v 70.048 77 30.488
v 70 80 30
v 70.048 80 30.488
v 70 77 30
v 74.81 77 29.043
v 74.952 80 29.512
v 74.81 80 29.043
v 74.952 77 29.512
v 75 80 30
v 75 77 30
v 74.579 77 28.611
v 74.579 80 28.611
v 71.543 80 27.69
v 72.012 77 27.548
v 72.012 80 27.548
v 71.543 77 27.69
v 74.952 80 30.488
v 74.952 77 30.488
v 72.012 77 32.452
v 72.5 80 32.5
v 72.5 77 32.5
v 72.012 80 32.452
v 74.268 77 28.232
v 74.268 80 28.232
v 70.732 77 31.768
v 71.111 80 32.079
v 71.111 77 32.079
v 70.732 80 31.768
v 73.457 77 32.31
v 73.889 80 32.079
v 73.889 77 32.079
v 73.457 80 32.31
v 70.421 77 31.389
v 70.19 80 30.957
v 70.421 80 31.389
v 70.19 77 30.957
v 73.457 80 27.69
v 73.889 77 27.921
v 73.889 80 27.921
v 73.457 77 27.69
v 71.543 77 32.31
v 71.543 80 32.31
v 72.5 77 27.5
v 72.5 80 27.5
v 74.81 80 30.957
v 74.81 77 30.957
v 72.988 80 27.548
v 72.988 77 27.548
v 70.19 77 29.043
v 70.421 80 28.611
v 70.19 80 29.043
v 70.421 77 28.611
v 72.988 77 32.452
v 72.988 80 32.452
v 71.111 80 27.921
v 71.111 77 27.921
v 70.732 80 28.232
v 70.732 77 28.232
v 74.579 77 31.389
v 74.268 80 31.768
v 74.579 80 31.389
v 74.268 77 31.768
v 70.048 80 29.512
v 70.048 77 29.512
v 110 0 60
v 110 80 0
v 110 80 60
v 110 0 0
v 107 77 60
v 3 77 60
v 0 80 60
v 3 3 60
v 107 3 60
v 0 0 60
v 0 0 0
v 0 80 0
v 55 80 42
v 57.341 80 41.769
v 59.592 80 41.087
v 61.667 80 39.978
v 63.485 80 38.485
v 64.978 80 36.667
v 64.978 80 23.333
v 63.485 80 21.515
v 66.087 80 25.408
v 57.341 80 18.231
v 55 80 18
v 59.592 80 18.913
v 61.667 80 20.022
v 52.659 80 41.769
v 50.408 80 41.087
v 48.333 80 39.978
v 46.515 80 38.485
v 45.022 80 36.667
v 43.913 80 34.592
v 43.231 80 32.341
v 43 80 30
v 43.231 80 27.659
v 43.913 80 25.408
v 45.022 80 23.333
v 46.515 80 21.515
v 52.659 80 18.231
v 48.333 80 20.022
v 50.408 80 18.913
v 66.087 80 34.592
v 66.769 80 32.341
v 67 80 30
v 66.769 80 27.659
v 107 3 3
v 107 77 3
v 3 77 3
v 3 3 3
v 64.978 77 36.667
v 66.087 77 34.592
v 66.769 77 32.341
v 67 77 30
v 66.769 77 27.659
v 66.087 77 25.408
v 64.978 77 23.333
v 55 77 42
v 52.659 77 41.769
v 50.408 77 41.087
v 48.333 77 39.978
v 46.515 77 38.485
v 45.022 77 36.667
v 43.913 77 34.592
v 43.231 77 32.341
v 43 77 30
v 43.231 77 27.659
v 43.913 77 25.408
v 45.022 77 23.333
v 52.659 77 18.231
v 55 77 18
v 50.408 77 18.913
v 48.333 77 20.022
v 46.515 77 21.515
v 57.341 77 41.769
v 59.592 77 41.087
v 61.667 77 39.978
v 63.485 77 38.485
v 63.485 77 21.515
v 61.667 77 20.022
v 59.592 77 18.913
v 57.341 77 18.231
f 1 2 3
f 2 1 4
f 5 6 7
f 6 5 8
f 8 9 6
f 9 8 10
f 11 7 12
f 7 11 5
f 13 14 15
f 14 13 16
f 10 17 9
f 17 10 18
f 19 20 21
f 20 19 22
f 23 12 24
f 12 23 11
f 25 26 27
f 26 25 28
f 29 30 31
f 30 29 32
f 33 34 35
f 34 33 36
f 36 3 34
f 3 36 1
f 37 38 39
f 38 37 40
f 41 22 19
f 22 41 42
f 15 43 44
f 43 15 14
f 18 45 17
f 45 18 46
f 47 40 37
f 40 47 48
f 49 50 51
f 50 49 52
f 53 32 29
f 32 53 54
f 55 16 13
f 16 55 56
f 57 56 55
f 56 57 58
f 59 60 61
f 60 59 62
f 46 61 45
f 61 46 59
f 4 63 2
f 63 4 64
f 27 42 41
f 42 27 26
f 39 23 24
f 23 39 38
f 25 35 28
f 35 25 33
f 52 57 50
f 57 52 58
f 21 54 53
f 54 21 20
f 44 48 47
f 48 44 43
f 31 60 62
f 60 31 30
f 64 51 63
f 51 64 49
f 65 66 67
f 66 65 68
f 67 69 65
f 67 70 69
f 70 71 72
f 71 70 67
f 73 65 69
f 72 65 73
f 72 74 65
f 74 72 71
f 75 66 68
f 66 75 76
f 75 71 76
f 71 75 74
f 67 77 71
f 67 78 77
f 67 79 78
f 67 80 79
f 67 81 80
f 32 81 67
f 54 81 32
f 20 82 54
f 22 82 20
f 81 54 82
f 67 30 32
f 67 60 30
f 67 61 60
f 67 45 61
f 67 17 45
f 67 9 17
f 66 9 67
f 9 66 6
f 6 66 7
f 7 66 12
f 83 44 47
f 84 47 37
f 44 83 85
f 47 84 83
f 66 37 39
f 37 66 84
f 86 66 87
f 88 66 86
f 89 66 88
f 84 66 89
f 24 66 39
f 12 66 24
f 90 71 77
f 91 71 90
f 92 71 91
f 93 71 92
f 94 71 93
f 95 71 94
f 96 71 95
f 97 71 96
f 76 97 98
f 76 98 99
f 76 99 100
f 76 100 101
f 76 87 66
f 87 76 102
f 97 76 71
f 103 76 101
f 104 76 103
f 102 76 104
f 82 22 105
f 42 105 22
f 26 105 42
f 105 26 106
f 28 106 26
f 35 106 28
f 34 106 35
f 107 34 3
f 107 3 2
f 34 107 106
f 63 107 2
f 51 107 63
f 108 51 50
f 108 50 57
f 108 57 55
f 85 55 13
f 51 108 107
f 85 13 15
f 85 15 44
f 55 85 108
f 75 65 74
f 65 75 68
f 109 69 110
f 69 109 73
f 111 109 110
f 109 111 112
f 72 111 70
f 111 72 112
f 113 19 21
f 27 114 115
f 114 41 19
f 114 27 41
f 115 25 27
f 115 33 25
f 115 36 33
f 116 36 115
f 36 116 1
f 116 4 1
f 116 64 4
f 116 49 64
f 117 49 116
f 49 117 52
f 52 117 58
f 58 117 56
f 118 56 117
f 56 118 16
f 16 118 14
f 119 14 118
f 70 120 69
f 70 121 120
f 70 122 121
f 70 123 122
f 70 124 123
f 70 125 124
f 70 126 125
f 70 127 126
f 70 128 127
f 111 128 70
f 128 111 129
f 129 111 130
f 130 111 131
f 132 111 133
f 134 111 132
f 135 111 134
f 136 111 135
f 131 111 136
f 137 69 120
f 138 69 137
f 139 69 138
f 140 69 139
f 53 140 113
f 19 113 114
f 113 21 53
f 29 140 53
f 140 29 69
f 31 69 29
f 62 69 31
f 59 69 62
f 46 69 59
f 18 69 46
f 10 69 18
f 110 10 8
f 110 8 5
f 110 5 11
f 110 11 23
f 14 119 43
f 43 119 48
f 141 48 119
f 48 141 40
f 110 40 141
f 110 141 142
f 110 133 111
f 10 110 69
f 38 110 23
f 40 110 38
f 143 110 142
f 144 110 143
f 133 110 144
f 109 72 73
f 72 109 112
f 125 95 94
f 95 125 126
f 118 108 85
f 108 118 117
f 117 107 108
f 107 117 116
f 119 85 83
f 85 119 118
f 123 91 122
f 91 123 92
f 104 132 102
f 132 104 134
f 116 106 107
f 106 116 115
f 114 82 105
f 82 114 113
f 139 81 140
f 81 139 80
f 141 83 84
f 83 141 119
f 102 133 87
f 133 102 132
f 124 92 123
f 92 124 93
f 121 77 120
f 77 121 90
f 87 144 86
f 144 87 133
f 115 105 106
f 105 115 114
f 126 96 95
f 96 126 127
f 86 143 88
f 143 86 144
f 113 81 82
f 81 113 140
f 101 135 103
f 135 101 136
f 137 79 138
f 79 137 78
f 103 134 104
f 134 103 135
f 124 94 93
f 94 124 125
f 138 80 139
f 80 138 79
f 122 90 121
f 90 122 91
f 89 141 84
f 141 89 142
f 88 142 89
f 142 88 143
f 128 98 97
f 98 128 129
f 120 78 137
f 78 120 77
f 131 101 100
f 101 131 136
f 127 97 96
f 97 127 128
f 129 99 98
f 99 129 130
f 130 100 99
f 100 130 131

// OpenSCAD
$fn = 32;

// ----------------------------------------------------------------------
// Vent box: roundvent enclosure
// ----------------------------------------------------------------------

// --- parameters (mm) ---
box_l = 110;              // box length, X
box_w = 80;               // box width, Y
box_h = 60;               // box height, Z
wall_t = 3;               // shell wall thickness
vent_d = 24;              // central vent diameter
ring_d = 5;               // ring hole diameter
n_ring = 8;               // holes in the ring
ring_r = 17.5;            // ring radius
fit_tol = 0.05;           // tolerance for press fits, mm
free_tol = 0.2;           // tolerance for clearance fits, mm

ring_step = 360 / n_ring;  // ring hole angular step

difference() {
  cube([box_l, box_w, box_h]);
  translate([wall_t, wall_t, wall_t])
    cube([box_l - 2 * wall_t, box_w - 2 * wall_t, box_h]);
  translate([box_l / 2, box_w - wall_t - 1, box_h / 2])
    rotate([-90, 0, 0]) cylinder(h = wall_t + 2, d = vent_d);
  for (i = [0 : n_ring - 1])
    translate([box_l / 2, box_w - wall_t - 1, box_h / 2])
      rotate([0, 0, i * ring_step])
        translate([ring_r, 0, 0]) rotate([-90, 0, 0])
          cylinder(h = wall_t + 2, d = ring_d);
}
